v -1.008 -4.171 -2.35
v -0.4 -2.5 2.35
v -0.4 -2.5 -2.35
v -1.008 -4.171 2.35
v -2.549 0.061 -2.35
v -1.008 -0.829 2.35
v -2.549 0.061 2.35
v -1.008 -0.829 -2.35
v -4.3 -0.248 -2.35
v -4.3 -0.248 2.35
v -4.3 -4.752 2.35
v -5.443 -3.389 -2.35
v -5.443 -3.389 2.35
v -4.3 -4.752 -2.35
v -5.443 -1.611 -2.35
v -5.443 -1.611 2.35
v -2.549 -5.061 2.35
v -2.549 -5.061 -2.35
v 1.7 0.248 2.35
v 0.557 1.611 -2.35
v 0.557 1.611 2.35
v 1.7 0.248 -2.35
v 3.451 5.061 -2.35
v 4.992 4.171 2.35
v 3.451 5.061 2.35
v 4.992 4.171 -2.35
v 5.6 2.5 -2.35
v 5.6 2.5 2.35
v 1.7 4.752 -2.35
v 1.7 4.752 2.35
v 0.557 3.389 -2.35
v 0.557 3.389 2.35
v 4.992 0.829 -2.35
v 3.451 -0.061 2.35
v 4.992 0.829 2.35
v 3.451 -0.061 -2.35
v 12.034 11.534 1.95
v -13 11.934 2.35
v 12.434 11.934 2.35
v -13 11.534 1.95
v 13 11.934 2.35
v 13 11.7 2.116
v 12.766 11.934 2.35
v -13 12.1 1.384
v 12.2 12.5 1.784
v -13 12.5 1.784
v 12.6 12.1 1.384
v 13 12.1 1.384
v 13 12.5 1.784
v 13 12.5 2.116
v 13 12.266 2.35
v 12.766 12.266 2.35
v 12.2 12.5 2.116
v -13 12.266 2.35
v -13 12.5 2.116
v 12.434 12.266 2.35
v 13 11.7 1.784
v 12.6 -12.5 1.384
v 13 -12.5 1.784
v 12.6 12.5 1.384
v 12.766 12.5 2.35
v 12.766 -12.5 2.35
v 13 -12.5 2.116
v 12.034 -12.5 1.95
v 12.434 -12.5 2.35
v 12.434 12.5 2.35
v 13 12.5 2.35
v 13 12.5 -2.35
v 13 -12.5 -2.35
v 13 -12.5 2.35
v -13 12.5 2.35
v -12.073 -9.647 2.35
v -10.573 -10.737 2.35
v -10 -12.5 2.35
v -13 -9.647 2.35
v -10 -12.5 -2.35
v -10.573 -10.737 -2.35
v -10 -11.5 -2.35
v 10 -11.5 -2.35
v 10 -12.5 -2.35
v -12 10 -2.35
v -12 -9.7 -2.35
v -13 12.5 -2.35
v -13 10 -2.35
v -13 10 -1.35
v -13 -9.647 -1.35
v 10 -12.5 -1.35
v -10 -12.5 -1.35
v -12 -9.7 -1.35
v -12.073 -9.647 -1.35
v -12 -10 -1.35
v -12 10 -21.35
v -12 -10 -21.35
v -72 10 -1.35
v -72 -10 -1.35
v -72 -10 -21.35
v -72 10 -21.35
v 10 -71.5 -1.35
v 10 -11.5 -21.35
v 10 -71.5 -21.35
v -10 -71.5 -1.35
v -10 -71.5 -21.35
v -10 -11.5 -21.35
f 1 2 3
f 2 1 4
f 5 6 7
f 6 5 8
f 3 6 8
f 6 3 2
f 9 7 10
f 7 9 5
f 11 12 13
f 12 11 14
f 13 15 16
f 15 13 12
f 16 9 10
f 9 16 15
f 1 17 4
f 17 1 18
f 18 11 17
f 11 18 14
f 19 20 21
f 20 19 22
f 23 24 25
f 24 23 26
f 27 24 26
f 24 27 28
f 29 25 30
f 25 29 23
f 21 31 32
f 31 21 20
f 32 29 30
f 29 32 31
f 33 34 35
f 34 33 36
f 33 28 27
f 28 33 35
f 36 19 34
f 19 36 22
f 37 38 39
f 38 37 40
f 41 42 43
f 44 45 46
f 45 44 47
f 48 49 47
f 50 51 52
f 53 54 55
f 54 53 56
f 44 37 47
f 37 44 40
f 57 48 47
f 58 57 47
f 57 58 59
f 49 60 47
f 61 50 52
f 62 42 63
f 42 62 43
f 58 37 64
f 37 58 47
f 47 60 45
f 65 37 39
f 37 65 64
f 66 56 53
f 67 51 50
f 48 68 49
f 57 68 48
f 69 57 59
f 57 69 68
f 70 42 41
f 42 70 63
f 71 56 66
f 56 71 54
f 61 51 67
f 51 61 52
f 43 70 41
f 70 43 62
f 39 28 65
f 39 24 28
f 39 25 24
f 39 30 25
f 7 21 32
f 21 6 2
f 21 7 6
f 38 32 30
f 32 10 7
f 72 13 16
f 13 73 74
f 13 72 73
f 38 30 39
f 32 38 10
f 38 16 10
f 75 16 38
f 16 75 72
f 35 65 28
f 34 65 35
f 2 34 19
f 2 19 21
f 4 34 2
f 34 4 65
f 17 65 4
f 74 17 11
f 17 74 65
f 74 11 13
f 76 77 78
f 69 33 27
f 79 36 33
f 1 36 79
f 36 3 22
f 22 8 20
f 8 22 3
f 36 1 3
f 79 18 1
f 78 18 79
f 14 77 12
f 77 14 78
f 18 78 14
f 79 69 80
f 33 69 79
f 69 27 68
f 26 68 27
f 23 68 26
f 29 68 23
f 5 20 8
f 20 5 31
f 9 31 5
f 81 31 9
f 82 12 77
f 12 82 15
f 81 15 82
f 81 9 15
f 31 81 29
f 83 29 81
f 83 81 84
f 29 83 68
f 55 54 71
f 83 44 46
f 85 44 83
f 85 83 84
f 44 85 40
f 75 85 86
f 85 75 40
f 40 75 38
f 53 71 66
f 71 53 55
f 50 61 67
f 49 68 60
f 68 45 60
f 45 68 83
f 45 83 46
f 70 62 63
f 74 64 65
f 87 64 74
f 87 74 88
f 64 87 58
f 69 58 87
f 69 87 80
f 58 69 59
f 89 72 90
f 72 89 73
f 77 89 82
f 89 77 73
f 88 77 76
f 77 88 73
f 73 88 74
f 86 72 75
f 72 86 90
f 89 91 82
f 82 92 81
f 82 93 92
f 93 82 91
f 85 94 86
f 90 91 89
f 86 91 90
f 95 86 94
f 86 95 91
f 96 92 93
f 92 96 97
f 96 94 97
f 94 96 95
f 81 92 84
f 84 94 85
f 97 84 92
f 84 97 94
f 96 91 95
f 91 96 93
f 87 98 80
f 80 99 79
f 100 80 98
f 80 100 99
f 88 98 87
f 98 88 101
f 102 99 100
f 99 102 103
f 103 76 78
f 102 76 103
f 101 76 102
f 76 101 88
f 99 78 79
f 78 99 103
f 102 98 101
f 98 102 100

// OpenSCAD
// Parameters
overall_length_x = 26; //[13:52:0.5]
overall_length_y = 25; //[12.5:50:0.5]
thickness_z = 4.7; //[2.35:9.4:0.1]
corner_angle_deg = 90; //[60:120:1]
hole_count = 2; //[1:4:1]
hole_diameter = 5; //[3:8:0.1]
hole_center_offset_from_corner = 10; //[5:20:0.5]
hole_countersink = 0; //[0:1:1]
tolerance = 0.2; //[0.05:0.5:0.05]
edge_chamfer = 0.8; //[0.2:2:0.1]
inner_corner_relief_radius = 3; //[1:8:0.5]
overlap = 1; //[0.5:2:0.1]
extrusion_size = 20; //[10:40:1]
extrusion_length = 60; //[30:120:1]

// Extrusion - complete geometry
module extrusion() {
  color([0.85, 0.85, 0.8]) {
    // Simplified extrusion context
    translate([-overall_length_x/2 - extrusion_length/2 + overlap, 0, -thickness_z/2 - extrusion_size/2 + overlap])
      cube([extrusion_length, extrusion_size, extrusion_size], center=true);
    translate([0, -overall_length_y/2 - extrusion_length/2 + overlap, -thickness_z/2 - extrusion_size/2 + overlap])
      cube([extrusion_size, extrusion_length, extrusion_size], center=true);
  }
}

// Extrusion Corner Bracket Assembly - complete geometry
module extrusion_corner_bracket_assembly() {
  color("Silver") {
    extrusion_inner_corner_bracket();
    extrusion();
  }
}

// Extrusion Corner Bracket Hole Positions - complete geometry
module extrusion_corner_bracket_hole_positions() {
  color("Silver") {
    translate([-overall_length_x/2 + hole_center_offset_from_corner, -overall_length_y/2 + hole_center_offset_from_corner, 0])
      cylinder(h=thickness_z + 2*overlap, r=(hole_diameter + tolerance)/2, center=true);
    translate([overall_length_x/2 - hole_center_offset_from_corner, overall_length_y/2 - hole_center_offset_from_corner, 0])
      cylinder(h=thickness_z + 2*overlap, r=(hole_diameter + tolerance)/2, center=true);
  }
}

// Extrusion Inner Corner Bracket - complete geometry
module extrusion_inner_corner_bracket() {
  color("Silver") {
    difference() {
      cube([overall_length_x, overall_length_y, thickness_z], center=true);
      extrusion_corner_bracket_hole_positions();
      translate([-overall_length_x/2, -overall_length_y/2, 0])
        cylinder(h=thickness_z + 2*overlap, r=inner_corner_relief_radius, center=true);
      union() {
        translate([0, overall_length_y/2 - edge_chamfer/2, thickness_z/2 - edge_chamfer/2])
          rotate([45, 0, 0]) cube([overall_length_x + 2*overlap, edge_chamfer, edge_chamfer], center=true);
        translate([overall_length_x/2 - edge_chamfer/2, 0, thickness_z/2 - edge_chamfer/2])
          rotate([0, 45, 0]) cube([edge_chamfer, overall_length_y + 2*overlap, edge_chamfer], center=true);
      }
    }
  }
}

// Extrusion Corner Bracket 3D - complete geometry
module extrusion_corner_bracket_3D() {
  color("Silver") {
    extrusion_inner_corner_bracket();
    extrusion();
  }
}

// Assembly
module assembly() {
  extrusion_corner_bracket_assembly();
}

assembly();
